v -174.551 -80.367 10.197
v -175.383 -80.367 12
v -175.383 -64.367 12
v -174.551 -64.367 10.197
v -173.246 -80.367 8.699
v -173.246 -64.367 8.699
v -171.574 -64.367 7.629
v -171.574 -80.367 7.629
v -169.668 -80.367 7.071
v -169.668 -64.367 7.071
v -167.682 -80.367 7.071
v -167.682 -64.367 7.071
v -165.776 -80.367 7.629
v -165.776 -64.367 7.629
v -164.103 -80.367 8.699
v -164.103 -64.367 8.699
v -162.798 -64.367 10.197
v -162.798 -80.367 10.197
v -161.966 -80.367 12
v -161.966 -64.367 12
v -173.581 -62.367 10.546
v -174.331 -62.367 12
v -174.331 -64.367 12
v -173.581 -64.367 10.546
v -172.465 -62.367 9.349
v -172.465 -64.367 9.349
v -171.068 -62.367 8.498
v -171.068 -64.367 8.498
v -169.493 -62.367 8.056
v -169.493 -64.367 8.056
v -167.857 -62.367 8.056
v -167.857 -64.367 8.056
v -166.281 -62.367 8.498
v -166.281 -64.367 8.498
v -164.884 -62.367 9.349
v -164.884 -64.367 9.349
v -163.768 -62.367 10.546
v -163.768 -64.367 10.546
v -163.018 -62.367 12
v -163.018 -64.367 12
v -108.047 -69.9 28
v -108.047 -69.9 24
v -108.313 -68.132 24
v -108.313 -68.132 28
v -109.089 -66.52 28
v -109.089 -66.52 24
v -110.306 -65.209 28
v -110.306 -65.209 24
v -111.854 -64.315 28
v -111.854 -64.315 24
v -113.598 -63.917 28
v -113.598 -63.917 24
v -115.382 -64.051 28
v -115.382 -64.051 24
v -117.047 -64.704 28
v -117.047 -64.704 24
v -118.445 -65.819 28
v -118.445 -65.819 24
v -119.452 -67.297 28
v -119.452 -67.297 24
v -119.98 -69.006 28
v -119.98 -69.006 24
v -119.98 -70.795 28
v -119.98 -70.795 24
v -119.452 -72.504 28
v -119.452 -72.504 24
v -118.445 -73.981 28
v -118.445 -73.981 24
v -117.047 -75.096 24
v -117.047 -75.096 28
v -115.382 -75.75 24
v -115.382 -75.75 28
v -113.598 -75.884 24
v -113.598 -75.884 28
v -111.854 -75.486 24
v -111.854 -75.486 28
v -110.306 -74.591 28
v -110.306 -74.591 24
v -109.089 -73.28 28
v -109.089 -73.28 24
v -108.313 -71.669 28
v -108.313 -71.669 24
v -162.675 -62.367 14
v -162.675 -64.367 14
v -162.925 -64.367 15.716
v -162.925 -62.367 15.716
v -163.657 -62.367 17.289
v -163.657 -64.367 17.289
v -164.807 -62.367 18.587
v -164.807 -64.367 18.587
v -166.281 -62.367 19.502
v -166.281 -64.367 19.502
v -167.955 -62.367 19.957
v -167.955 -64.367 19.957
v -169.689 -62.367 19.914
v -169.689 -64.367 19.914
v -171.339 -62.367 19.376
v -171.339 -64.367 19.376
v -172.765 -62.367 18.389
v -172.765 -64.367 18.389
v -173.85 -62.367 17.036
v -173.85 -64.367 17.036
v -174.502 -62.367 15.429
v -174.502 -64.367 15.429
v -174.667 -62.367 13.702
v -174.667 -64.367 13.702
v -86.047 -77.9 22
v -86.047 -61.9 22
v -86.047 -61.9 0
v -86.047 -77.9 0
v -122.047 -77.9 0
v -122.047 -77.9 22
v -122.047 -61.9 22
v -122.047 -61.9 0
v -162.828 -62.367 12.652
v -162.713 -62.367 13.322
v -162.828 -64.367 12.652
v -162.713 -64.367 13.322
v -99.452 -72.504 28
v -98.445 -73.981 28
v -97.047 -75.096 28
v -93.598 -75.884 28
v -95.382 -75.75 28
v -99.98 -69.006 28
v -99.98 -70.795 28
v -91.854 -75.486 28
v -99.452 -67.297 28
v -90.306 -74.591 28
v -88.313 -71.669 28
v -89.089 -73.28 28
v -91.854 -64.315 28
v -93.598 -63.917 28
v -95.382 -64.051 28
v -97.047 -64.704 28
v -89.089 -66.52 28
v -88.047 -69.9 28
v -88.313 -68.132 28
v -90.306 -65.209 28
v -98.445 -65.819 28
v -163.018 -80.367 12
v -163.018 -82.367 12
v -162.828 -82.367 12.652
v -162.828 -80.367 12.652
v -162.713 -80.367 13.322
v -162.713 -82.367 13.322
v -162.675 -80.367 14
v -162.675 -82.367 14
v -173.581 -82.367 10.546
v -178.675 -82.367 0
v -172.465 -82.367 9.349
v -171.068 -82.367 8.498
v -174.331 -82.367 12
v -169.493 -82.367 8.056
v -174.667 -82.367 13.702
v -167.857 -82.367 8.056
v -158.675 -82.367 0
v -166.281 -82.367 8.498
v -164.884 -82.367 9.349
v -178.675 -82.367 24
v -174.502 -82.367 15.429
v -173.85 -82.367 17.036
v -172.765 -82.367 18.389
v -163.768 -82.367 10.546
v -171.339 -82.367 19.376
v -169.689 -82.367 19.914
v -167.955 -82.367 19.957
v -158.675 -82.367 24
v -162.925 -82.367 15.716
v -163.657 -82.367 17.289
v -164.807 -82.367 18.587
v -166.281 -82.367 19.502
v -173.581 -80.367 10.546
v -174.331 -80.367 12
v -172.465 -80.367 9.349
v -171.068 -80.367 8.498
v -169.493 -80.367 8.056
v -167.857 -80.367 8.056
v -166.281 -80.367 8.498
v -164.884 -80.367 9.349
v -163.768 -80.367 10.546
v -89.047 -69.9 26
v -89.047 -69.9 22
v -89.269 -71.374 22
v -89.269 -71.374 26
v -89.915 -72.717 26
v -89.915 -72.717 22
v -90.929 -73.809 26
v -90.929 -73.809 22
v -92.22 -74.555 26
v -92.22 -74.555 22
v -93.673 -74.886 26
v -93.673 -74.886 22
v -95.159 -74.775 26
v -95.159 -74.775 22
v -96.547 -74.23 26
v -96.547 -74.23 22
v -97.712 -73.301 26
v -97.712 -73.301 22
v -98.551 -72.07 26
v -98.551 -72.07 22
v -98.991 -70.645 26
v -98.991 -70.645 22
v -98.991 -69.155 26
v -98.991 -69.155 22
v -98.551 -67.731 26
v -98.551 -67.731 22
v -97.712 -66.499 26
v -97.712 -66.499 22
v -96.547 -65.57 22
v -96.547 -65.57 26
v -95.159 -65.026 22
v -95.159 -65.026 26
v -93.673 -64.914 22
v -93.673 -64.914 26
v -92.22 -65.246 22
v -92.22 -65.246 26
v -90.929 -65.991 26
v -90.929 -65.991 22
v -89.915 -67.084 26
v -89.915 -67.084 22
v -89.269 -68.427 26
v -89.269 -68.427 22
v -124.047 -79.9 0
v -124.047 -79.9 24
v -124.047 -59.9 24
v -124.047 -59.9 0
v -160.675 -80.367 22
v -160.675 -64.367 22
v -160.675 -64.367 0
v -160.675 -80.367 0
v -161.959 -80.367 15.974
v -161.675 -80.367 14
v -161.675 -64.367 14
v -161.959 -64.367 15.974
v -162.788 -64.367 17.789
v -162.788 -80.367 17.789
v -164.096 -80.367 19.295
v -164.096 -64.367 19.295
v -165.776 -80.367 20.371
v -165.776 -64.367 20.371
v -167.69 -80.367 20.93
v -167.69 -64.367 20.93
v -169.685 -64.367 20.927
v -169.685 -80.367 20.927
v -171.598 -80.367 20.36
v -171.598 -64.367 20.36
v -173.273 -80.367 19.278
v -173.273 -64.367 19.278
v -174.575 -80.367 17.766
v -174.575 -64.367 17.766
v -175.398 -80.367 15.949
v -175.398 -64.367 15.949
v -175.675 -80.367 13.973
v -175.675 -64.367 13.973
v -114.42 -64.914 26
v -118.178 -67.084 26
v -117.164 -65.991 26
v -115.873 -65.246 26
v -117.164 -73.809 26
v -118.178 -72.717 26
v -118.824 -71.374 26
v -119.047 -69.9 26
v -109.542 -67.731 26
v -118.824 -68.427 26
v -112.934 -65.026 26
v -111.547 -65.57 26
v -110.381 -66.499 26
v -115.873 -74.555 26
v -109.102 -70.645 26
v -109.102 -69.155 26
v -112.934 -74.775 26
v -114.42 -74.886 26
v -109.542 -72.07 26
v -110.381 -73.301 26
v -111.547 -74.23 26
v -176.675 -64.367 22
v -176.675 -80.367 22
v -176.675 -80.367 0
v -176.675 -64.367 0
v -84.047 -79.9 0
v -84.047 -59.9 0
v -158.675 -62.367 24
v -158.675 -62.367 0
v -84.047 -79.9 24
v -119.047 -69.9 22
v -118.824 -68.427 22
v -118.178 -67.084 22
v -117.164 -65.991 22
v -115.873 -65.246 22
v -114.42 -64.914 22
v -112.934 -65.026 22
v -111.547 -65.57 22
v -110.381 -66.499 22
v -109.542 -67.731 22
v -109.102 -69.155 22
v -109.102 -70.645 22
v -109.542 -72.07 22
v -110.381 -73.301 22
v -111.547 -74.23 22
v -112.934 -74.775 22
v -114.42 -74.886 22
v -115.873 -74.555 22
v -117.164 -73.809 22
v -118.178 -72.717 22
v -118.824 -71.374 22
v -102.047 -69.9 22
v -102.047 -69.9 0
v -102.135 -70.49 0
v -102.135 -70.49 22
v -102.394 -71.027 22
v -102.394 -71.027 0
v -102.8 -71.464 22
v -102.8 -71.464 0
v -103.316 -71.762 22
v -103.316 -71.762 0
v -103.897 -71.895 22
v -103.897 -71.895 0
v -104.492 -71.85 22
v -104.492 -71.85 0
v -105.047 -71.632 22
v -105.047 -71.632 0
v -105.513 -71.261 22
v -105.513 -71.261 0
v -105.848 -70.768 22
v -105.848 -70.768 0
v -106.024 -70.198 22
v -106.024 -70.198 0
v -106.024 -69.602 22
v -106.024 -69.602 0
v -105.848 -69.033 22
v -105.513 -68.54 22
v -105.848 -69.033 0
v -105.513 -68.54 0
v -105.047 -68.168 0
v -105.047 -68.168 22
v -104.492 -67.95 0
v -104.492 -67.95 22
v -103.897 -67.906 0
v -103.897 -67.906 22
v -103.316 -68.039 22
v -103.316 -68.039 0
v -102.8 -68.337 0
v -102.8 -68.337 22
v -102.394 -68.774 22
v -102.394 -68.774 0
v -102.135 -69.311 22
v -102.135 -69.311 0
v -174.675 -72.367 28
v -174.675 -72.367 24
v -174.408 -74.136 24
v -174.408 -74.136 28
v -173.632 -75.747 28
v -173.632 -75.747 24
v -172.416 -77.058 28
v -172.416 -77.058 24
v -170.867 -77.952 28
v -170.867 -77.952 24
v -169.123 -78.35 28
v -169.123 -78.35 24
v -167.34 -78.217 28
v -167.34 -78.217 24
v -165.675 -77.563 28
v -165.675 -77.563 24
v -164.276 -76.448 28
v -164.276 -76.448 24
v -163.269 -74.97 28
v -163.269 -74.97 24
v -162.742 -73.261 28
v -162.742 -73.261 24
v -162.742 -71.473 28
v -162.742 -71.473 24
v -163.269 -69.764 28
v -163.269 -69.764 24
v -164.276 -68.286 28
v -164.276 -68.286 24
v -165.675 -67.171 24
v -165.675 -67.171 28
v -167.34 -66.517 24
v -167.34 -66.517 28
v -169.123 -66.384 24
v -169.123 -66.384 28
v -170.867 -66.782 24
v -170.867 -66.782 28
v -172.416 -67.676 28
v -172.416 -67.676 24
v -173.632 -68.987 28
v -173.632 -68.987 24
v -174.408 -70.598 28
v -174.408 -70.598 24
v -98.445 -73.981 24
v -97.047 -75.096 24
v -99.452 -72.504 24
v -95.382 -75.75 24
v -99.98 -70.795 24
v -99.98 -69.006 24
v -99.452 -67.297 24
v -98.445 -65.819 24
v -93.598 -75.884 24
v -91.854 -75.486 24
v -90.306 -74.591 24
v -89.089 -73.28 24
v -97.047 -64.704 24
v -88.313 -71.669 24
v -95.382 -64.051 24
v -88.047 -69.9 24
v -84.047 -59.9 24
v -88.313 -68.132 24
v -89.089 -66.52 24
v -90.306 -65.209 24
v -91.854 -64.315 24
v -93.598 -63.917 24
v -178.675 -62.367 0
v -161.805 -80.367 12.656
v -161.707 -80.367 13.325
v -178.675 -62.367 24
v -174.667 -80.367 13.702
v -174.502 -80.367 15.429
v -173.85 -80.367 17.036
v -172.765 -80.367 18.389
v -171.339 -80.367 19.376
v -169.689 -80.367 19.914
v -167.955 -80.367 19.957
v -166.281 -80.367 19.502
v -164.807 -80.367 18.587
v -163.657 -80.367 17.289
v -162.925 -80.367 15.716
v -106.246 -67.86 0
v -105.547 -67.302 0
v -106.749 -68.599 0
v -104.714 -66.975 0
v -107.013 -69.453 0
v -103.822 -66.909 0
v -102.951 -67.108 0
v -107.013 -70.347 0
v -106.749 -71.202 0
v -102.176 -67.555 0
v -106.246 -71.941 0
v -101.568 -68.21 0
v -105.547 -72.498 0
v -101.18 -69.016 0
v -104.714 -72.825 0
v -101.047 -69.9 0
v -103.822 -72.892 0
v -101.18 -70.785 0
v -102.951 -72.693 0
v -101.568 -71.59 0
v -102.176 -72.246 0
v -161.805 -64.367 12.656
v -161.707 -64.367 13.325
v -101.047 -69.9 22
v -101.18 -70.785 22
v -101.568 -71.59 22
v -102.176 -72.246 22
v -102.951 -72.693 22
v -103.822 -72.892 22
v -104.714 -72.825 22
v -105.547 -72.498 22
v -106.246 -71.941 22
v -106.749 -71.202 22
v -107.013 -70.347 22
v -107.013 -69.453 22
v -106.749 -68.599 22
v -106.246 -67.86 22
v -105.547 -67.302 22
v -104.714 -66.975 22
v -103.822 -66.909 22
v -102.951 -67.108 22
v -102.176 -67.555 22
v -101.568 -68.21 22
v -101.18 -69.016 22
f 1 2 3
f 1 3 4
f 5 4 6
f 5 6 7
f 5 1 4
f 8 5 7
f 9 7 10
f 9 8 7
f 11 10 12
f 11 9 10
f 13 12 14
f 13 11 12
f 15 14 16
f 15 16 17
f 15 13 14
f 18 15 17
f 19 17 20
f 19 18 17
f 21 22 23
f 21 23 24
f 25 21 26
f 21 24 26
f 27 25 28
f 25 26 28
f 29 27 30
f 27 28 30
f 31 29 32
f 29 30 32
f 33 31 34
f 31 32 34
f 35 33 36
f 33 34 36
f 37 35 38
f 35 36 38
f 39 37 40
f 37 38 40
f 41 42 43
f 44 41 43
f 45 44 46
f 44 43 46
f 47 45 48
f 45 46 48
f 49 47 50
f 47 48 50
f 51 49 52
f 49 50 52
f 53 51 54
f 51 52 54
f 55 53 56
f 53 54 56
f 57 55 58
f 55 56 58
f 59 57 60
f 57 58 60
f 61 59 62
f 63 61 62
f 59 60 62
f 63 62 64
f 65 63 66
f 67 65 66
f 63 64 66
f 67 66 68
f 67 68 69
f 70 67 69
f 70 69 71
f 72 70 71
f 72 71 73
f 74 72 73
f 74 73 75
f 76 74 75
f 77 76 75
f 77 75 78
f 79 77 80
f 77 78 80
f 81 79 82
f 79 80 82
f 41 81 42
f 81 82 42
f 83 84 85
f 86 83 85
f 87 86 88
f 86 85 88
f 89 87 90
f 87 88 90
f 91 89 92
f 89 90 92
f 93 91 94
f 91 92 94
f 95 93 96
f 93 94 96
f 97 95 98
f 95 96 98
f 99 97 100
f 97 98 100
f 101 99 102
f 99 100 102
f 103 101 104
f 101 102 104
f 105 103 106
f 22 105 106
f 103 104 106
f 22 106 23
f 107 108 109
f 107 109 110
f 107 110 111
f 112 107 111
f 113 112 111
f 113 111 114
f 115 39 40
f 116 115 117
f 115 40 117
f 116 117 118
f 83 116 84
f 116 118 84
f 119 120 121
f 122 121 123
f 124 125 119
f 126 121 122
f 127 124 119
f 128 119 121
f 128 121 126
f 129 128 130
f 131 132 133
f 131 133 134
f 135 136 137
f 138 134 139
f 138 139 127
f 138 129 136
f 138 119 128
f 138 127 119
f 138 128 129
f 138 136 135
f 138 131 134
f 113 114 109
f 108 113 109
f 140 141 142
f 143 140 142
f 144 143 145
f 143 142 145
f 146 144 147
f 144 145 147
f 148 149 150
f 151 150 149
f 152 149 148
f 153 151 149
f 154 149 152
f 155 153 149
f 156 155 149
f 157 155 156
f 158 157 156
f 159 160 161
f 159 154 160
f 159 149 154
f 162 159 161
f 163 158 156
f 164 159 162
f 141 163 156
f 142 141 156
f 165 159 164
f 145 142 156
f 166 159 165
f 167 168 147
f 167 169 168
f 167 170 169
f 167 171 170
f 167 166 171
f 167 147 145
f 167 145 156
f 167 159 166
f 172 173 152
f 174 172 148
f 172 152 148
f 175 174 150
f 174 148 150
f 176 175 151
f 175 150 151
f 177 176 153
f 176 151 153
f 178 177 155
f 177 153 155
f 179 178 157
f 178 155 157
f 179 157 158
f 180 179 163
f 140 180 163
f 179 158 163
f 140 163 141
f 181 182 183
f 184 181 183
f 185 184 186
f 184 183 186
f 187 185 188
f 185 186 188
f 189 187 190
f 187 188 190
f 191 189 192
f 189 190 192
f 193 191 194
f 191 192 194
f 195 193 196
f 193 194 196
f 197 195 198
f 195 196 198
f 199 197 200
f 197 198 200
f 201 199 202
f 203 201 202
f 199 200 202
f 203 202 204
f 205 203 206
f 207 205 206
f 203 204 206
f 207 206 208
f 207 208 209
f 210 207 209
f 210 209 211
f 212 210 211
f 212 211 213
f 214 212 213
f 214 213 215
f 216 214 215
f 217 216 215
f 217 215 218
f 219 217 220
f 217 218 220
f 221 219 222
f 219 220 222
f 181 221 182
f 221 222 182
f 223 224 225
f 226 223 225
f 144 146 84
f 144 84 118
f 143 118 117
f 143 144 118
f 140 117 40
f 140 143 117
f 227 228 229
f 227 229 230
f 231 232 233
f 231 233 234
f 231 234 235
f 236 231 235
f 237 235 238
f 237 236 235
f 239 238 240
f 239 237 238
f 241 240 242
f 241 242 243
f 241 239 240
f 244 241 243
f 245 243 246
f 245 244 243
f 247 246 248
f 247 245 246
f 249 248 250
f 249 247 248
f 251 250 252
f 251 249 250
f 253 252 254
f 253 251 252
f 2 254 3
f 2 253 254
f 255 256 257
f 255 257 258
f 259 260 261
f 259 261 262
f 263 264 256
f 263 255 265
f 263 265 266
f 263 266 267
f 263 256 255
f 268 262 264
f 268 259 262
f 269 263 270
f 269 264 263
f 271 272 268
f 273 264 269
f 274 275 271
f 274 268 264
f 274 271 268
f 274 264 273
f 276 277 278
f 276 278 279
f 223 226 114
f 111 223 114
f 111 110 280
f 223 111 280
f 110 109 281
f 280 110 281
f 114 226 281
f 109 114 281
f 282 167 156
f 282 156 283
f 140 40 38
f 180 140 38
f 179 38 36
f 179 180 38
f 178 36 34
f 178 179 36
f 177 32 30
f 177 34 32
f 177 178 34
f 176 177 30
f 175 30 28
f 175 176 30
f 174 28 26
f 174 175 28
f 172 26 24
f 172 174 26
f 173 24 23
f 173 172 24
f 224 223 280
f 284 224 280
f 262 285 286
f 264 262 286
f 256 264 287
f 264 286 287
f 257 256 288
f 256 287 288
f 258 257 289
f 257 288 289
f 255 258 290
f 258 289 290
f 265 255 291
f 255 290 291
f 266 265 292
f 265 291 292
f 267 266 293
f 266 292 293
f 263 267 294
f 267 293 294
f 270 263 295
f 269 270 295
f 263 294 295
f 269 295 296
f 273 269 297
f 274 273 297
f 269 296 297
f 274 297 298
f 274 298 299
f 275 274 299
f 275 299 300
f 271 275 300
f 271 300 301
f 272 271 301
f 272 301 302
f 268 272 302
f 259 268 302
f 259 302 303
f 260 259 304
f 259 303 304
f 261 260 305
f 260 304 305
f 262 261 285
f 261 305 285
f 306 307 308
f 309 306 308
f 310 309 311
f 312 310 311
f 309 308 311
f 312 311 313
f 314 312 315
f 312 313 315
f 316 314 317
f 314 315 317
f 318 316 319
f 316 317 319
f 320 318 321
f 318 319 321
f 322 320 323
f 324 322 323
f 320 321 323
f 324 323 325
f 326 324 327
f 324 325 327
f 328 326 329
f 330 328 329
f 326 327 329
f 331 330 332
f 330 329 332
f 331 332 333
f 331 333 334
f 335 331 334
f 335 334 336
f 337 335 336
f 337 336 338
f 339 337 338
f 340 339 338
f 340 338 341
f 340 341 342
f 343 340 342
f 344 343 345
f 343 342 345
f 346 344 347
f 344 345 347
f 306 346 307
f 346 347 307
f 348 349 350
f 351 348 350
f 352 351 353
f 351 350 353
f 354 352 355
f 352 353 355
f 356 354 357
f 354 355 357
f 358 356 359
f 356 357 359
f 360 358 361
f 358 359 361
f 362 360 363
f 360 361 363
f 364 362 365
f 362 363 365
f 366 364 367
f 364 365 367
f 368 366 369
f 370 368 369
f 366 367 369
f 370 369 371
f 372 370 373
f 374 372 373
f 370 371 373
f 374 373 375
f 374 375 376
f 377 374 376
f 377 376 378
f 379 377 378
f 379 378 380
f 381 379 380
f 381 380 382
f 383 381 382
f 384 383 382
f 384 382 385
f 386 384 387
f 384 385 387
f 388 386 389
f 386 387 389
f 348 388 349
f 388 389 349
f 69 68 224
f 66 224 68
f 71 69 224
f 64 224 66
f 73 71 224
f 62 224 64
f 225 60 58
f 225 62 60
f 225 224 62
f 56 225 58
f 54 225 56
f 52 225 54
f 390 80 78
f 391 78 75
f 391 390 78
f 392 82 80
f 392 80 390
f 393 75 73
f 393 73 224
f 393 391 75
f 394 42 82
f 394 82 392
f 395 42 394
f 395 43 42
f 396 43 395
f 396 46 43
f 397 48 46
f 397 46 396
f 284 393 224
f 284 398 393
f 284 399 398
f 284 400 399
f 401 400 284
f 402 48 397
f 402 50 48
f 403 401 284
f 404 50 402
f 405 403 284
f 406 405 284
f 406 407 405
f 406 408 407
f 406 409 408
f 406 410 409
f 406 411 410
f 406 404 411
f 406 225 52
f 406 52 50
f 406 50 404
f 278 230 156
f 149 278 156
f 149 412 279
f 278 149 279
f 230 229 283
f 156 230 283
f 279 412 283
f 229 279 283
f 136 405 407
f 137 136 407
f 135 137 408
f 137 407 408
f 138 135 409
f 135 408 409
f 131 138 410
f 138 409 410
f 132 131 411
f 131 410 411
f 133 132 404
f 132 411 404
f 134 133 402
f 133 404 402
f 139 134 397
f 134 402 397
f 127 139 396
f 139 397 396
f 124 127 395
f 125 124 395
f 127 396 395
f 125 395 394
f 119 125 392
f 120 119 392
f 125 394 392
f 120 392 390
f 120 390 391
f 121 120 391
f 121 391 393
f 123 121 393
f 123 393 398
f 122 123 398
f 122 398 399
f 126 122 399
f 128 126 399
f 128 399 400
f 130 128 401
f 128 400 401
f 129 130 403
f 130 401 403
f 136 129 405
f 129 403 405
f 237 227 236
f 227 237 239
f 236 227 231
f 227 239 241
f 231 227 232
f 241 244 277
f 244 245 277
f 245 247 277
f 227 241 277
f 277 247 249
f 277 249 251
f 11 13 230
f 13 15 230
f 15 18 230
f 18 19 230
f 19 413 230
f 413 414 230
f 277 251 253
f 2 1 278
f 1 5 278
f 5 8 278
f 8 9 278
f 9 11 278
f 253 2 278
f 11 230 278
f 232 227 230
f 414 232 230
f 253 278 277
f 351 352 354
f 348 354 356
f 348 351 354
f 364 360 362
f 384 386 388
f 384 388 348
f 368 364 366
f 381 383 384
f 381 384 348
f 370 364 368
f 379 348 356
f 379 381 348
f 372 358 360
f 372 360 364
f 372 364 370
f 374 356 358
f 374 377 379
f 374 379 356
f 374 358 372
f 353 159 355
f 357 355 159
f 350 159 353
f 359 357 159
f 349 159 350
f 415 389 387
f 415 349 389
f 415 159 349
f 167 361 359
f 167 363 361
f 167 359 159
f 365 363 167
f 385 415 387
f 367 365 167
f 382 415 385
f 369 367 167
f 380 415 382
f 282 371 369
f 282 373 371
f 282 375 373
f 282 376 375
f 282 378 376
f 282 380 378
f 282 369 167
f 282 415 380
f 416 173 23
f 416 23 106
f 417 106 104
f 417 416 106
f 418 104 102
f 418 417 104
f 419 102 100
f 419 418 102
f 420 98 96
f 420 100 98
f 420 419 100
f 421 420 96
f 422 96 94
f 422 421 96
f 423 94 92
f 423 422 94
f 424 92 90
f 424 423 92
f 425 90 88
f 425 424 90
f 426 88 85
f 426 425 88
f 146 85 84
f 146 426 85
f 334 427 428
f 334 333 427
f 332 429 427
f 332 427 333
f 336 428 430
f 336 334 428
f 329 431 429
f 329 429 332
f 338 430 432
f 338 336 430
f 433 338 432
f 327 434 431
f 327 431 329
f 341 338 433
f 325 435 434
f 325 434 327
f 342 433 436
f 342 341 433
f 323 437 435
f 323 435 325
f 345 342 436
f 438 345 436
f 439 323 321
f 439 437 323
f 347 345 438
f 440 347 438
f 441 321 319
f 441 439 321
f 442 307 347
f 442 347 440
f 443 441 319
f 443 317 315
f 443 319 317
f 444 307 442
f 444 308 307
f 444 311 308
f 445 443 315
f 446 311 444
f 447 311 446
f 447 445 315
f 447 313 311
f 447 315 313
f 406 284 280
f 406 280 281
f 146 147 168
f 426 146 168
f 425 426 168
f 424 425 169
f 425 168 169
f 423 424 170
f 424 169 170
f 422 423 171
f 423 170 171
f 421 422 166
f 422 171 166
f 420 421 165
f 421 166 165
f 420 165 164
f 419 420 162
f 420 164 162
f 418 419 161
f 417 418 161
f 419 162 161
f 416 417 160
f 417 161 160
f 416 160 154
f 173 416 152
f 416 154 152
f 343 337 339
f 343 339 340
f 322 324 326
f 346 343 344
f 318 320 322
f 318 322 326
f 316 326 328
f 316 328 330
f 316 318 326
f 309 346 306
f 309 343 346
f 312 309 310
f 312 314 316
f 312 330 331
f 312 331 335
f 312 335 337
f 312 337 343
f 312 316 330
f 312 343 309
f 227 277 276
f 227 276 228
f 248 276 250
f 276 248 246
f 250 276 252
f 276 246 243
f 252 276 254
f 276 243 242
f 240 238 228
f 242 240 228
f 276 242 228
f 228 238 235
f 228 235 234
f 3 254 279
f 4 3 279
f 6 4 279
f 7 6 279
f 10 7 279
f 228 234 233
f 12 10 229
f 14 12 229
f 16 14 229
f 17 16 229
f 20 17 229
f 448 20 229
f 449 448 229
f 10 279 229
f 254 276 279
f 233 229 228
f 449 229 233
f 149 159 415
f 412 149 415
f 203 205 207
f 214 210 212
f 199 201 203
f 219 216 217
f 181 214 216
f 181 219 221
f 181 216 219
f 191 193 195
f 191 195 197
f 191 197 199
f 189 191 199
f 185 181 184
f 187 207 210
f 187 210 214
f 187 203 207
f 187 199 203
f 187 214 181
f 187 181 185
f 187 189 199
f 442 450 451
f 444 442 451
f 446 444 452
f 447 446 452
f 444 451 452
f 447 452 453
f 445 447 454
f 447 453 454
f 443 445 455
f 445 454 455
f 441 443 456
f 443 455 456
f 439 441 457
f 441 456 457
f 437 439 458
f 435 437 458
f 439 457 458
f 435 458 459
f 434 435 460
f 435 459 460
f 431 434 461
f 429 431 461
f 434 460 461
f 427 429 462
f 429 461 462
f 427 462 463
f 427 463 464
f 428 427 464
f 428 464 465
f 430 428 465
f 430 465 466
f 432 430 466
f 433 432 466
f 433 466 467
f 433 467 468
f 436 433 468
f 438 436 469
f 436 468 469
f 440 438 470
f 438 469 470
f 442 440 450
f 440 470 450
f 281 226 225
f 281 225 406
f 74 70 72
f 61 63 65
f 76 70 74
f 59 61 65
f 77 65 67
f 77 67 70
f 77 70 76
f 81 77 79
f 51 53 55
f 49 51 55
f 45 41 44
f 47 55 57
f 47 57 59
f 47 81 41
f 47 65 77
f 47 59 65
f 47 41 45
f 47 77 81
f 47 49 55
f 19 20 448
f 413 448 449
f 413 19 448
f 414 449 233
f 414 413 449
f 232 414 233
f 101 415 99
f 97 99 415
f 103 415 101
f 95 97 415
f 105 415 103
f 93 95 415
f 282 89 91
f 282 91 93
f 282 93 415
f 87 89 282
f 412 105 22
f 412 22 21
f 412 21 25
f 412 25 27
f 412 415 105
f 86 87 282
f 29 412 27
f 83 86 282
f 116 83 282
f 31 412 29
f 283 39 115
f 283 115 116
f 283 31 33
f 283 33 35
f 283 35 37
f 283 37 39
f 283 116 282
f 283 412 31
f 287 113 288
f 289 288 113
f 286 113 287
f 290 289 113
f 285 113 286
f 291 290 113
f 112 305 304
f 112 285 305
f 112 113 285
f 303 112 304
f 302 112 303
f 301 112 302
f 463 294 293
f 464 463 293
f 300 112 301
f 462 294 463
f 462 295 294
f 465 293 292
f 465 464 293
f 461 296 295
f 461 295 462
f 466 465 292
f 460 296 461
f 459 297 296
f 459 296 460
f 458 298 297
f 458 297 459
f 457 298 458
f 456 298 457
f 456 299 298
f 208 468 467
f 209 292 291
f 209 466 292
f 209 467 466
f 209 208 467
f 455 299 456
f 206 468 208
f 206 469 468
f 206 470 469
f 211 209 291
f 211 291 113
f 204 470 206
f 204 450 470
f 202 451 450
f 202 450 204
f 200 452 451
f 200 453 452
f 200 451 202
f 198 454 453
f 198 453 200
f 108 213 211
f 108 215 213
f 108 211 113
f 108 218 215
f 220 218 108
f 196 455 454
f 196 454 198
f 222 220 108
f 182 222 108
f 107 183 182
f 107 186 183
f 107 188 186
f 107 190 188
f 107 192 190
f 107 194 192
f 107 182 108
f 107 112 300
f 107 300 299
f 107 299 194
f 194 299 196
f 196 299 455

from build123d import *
from build123d import SkipClean  # not in build123d's __all__

# Parameters (mm, degrees)
F0_W      = 40
F0_H      = 20
F1_DEPTH  = 24
F2_R      = 6
F3_DEPTH  = 4
F4_W      = 18
F4_H      = 8
F5_DEPTH  = 22
F6_R      = 5
F7_DEPTH  = 4
F9_DEPTH  = 22
F10_R     = 2
F11_DEPTH = 22
F12_W     = 20
F12_H     = 20
F13_DEPTH = 24
F15_DEPTH = 4
F16_W     = 8
F16_H     = 8
F17_DEPTH = 22
F19_DEPTH = 20
F20_DEPTH = 25


with BuildPart() as f1:
    # F0 (on Top) → F1 (new body)
    with BuildSketch(Plane.XY):
        with Locations((-104.0465351939, -69.9002796412)):
            Rectangle(F0_W, F0_H)
    extrude(amount=F1_DEPTH)

    # F2 (on face) → F3 (join)
    with BuildSketch(Plane.XY.offset(24)):
        with BuildLine():
            ThreePointArc((-120.0465351939, -69.9002796412), (-114.0465351939, -75.9002796412), (-108.0465351939, -69.9002796412))
            ThreePointArc((-108.0465351939, -69.9002796412), (-114.0465351939, -63.9002796412), (-120.0465351939, -69.9002796412))
        make_face()
        with Locations((-94.0465351939, -69.9002796412)):
            Circle(F2_R)
    extrude(amount=F3_DEPTH)

    # F4 (on face) → F5 (cut)
    with BuildSketch(Plane(origin=(0, 0, 0), x_dir=(1, 0, 0), z_dir=(0, 0, -1))):
        with Locations((-113.0465351939, 73.9002796412)):
            Rectangle(F4_W, F4_H)
        with Locations((-113.0465351939, 65.9002796412)):
            Rectangle(F4_W, F4_H)
        with Locations((-95.0465351939, 65.9002796412)):
            Rectangle(F4_W, F4_H)
        with Locations((-95.0465351939, 73.9002796412)):
            Rectangle(F4_W, F4_H)
    extrude(amount=-F5_DEPTH, mode=Mode.SUBTRACT)

    # F6 (on face) → F7 (cut)
    with BuildSketch(Plane(origin=(0, 0, 22), x_dir=(1, 0, 0), z_dir=(0, 0, -1))):
        with Locations((-94.0465351939, 69.9002796412)):
            Circle(F6_R)
        with BuildLine():
            ThreePointArc((-109.0465351939, 69.9002796412), (-114.0465351939, 74.9002796412), (-119.0465351939, 69.9002796412))
            ThreePointArc((-119.0465351939, 69.9002796412), (-114.0465351939, 64.9002796412), (-109.0465351939, 69.9002796412))
        make_face()
    extrude(amount=-F7_DEPTH, mode=Mode.SUBTRACT)

    # F8 (on face) → F9 (join)
    with BuildSketch(Plane(origin=(0, 0, 22), x_dir=(1, 0, 0), z_dir=(0, 0, -1))):
        with BuildLine():
            ThreePointArc((-107.0465351939, 69.9002796412), (-104.0465351939, 66.9002796412), (-101.0465351939, 69.9002796412))
            ThreePointArc((-101.0465351939, 69.9002796412), (-104.0465351939, 72.9002796412), (-107.0465351939, 69.9002796412))
        make_face()
    extrude(amount=F9_DEPTH)

    # F10 (on face) → F11 (cut)
    with BuildSketch(Plane(origin=(0, 0, 0), x_dir=(1, 0, 0), z_dir=(0, 0, -1))):
        with Locations((-104.0465351939, 69.9002796412)):
            Circle(F10_R)
    extrude(amount=-F11_DEPTH, mode=Mode.SUBTRACT)


with BuildPart() as f13:
    # F12 (on Top) → F13 (new body)
    with BuildSketch(Plane.XY):
        with Locations((-168.6746275425, -72.3669731617)):
            Rectangle(F12_W, F12_H)
    extrude(amount=F13_DEPTH)

    # F14 (on face) → F15 (join)
    with BuildSketch(Plane.XY.offset(24)):
        with BuildLine():
            ThreePointArc((-162.6746275425, -72.3669731617), (-168.6746275425, -66.3669731617), (-174.6746275425, -72.3669731617))
            ThreePointArc((-174.6746275425, -72.3669731617), (-168.6746275425, -78.3669731617), (-162.6746275425, -72.3669731617))
        make_face()
    extrude(amount=F15_DEPTH)

    # F16 (on face) → F17 (cut)
    with BuildSketch(Plane(origin=(0, 0, 0), x_dir=(1, 0, 0), z_dir=(0, 0, -1))):
        with Locations((-172.6746275425, 76.3669731617)):
            Rectangle(F16_W, F16_H)
        with Locations((-172.6746275425, 68.3669731617)):
            Rectangle(F16_W, F16_H)
        with Locations((-164.6746275425, 76.3669731617)):
            Rectangle(F16_W, F16_H)
        with Locations((-164.6746275425, 68.3669731617)):
            Rectangle(F16_W, F16_H)
    extrude(amount=-F17_DEPTH, mode=Mode.SUBTRACT)

    # F18 (on face) → F19 (join)
    with BuildSketch(Plane.XZ.offset(82.3669731617)):
        with BuildLine():
            Line((-174.331481792, 12), (-175.382831475, 12))
            ThreePointArc((-175.382831475, 12), (-168.6746275425, 7), (-161.96642361, 12))
            Line((-161.96642361, 12), (-163.017773293, 12))
            ThreePointArc((-163.017773293, 12), (-168.6746275425, 8), (-174.331481792, 12))
        make_face()
        with BuildLine():
            ThreePointArc((-161.6746275425, 14), (-169.6852146175, 20.9266668581), (-175.382831475, 12))
            Line((-175.382831475, 12), (-174.331481792, 12))
            ThreePointArc((-174.331481792, 12), (-169.6892394149, 19.9135913579), (-162.6746275425, 14))
            ThreePointArc((-162.6746275425, 14), (-162.7610361846, 12.9853881276), (-163.017773293, 12))
            Line((-163.017773293, 12), (-161.96642361, 12))
            ThreePointArc((-161.96642361, 12), (-161.7479606843, 12.989412925), (-161.6746275425, 14))
        make_face()
    extrude(amount=-F19_DEPTH)

    # F18 (on face) → F20 (cut)
    with BuildSketch(Plane.XZ.offset(82.3669731617)):
        with BuildLine():
            ThreePointArc((-162.6746275425, 14), (-169.6892394149, 19.9135913579), (-174.331481792, 12))
            Line((-174.331481792, 12), (-168.6746275425, 12))
            Line((-168.6746275425, 12), (-163.017773293, 12))
            ThreePointArc((-163.017773293, 12), (-162.7610361846, 12.9853881276), (-162.6746275425, 14))
        make_face()
        with BuildLine():
            Line((-168.6746275425, 12), (-174.331481792, 12))
            ThreePointArc((-174.331481792, 12), (-168.6746275425, 8), (-163.017773293, 12))
            Line((-163.017773293, 12), (-168.6746275425, 12))
        make_face()
    with SkipClean():  # cleaning this boolean's faces spoils the solid; the shape is the same uncleaned
        extrude(amount=-F20_DEPTH, mode=Mode.SUBTRACT)


solid = Compound([f1.part, f13.part])
